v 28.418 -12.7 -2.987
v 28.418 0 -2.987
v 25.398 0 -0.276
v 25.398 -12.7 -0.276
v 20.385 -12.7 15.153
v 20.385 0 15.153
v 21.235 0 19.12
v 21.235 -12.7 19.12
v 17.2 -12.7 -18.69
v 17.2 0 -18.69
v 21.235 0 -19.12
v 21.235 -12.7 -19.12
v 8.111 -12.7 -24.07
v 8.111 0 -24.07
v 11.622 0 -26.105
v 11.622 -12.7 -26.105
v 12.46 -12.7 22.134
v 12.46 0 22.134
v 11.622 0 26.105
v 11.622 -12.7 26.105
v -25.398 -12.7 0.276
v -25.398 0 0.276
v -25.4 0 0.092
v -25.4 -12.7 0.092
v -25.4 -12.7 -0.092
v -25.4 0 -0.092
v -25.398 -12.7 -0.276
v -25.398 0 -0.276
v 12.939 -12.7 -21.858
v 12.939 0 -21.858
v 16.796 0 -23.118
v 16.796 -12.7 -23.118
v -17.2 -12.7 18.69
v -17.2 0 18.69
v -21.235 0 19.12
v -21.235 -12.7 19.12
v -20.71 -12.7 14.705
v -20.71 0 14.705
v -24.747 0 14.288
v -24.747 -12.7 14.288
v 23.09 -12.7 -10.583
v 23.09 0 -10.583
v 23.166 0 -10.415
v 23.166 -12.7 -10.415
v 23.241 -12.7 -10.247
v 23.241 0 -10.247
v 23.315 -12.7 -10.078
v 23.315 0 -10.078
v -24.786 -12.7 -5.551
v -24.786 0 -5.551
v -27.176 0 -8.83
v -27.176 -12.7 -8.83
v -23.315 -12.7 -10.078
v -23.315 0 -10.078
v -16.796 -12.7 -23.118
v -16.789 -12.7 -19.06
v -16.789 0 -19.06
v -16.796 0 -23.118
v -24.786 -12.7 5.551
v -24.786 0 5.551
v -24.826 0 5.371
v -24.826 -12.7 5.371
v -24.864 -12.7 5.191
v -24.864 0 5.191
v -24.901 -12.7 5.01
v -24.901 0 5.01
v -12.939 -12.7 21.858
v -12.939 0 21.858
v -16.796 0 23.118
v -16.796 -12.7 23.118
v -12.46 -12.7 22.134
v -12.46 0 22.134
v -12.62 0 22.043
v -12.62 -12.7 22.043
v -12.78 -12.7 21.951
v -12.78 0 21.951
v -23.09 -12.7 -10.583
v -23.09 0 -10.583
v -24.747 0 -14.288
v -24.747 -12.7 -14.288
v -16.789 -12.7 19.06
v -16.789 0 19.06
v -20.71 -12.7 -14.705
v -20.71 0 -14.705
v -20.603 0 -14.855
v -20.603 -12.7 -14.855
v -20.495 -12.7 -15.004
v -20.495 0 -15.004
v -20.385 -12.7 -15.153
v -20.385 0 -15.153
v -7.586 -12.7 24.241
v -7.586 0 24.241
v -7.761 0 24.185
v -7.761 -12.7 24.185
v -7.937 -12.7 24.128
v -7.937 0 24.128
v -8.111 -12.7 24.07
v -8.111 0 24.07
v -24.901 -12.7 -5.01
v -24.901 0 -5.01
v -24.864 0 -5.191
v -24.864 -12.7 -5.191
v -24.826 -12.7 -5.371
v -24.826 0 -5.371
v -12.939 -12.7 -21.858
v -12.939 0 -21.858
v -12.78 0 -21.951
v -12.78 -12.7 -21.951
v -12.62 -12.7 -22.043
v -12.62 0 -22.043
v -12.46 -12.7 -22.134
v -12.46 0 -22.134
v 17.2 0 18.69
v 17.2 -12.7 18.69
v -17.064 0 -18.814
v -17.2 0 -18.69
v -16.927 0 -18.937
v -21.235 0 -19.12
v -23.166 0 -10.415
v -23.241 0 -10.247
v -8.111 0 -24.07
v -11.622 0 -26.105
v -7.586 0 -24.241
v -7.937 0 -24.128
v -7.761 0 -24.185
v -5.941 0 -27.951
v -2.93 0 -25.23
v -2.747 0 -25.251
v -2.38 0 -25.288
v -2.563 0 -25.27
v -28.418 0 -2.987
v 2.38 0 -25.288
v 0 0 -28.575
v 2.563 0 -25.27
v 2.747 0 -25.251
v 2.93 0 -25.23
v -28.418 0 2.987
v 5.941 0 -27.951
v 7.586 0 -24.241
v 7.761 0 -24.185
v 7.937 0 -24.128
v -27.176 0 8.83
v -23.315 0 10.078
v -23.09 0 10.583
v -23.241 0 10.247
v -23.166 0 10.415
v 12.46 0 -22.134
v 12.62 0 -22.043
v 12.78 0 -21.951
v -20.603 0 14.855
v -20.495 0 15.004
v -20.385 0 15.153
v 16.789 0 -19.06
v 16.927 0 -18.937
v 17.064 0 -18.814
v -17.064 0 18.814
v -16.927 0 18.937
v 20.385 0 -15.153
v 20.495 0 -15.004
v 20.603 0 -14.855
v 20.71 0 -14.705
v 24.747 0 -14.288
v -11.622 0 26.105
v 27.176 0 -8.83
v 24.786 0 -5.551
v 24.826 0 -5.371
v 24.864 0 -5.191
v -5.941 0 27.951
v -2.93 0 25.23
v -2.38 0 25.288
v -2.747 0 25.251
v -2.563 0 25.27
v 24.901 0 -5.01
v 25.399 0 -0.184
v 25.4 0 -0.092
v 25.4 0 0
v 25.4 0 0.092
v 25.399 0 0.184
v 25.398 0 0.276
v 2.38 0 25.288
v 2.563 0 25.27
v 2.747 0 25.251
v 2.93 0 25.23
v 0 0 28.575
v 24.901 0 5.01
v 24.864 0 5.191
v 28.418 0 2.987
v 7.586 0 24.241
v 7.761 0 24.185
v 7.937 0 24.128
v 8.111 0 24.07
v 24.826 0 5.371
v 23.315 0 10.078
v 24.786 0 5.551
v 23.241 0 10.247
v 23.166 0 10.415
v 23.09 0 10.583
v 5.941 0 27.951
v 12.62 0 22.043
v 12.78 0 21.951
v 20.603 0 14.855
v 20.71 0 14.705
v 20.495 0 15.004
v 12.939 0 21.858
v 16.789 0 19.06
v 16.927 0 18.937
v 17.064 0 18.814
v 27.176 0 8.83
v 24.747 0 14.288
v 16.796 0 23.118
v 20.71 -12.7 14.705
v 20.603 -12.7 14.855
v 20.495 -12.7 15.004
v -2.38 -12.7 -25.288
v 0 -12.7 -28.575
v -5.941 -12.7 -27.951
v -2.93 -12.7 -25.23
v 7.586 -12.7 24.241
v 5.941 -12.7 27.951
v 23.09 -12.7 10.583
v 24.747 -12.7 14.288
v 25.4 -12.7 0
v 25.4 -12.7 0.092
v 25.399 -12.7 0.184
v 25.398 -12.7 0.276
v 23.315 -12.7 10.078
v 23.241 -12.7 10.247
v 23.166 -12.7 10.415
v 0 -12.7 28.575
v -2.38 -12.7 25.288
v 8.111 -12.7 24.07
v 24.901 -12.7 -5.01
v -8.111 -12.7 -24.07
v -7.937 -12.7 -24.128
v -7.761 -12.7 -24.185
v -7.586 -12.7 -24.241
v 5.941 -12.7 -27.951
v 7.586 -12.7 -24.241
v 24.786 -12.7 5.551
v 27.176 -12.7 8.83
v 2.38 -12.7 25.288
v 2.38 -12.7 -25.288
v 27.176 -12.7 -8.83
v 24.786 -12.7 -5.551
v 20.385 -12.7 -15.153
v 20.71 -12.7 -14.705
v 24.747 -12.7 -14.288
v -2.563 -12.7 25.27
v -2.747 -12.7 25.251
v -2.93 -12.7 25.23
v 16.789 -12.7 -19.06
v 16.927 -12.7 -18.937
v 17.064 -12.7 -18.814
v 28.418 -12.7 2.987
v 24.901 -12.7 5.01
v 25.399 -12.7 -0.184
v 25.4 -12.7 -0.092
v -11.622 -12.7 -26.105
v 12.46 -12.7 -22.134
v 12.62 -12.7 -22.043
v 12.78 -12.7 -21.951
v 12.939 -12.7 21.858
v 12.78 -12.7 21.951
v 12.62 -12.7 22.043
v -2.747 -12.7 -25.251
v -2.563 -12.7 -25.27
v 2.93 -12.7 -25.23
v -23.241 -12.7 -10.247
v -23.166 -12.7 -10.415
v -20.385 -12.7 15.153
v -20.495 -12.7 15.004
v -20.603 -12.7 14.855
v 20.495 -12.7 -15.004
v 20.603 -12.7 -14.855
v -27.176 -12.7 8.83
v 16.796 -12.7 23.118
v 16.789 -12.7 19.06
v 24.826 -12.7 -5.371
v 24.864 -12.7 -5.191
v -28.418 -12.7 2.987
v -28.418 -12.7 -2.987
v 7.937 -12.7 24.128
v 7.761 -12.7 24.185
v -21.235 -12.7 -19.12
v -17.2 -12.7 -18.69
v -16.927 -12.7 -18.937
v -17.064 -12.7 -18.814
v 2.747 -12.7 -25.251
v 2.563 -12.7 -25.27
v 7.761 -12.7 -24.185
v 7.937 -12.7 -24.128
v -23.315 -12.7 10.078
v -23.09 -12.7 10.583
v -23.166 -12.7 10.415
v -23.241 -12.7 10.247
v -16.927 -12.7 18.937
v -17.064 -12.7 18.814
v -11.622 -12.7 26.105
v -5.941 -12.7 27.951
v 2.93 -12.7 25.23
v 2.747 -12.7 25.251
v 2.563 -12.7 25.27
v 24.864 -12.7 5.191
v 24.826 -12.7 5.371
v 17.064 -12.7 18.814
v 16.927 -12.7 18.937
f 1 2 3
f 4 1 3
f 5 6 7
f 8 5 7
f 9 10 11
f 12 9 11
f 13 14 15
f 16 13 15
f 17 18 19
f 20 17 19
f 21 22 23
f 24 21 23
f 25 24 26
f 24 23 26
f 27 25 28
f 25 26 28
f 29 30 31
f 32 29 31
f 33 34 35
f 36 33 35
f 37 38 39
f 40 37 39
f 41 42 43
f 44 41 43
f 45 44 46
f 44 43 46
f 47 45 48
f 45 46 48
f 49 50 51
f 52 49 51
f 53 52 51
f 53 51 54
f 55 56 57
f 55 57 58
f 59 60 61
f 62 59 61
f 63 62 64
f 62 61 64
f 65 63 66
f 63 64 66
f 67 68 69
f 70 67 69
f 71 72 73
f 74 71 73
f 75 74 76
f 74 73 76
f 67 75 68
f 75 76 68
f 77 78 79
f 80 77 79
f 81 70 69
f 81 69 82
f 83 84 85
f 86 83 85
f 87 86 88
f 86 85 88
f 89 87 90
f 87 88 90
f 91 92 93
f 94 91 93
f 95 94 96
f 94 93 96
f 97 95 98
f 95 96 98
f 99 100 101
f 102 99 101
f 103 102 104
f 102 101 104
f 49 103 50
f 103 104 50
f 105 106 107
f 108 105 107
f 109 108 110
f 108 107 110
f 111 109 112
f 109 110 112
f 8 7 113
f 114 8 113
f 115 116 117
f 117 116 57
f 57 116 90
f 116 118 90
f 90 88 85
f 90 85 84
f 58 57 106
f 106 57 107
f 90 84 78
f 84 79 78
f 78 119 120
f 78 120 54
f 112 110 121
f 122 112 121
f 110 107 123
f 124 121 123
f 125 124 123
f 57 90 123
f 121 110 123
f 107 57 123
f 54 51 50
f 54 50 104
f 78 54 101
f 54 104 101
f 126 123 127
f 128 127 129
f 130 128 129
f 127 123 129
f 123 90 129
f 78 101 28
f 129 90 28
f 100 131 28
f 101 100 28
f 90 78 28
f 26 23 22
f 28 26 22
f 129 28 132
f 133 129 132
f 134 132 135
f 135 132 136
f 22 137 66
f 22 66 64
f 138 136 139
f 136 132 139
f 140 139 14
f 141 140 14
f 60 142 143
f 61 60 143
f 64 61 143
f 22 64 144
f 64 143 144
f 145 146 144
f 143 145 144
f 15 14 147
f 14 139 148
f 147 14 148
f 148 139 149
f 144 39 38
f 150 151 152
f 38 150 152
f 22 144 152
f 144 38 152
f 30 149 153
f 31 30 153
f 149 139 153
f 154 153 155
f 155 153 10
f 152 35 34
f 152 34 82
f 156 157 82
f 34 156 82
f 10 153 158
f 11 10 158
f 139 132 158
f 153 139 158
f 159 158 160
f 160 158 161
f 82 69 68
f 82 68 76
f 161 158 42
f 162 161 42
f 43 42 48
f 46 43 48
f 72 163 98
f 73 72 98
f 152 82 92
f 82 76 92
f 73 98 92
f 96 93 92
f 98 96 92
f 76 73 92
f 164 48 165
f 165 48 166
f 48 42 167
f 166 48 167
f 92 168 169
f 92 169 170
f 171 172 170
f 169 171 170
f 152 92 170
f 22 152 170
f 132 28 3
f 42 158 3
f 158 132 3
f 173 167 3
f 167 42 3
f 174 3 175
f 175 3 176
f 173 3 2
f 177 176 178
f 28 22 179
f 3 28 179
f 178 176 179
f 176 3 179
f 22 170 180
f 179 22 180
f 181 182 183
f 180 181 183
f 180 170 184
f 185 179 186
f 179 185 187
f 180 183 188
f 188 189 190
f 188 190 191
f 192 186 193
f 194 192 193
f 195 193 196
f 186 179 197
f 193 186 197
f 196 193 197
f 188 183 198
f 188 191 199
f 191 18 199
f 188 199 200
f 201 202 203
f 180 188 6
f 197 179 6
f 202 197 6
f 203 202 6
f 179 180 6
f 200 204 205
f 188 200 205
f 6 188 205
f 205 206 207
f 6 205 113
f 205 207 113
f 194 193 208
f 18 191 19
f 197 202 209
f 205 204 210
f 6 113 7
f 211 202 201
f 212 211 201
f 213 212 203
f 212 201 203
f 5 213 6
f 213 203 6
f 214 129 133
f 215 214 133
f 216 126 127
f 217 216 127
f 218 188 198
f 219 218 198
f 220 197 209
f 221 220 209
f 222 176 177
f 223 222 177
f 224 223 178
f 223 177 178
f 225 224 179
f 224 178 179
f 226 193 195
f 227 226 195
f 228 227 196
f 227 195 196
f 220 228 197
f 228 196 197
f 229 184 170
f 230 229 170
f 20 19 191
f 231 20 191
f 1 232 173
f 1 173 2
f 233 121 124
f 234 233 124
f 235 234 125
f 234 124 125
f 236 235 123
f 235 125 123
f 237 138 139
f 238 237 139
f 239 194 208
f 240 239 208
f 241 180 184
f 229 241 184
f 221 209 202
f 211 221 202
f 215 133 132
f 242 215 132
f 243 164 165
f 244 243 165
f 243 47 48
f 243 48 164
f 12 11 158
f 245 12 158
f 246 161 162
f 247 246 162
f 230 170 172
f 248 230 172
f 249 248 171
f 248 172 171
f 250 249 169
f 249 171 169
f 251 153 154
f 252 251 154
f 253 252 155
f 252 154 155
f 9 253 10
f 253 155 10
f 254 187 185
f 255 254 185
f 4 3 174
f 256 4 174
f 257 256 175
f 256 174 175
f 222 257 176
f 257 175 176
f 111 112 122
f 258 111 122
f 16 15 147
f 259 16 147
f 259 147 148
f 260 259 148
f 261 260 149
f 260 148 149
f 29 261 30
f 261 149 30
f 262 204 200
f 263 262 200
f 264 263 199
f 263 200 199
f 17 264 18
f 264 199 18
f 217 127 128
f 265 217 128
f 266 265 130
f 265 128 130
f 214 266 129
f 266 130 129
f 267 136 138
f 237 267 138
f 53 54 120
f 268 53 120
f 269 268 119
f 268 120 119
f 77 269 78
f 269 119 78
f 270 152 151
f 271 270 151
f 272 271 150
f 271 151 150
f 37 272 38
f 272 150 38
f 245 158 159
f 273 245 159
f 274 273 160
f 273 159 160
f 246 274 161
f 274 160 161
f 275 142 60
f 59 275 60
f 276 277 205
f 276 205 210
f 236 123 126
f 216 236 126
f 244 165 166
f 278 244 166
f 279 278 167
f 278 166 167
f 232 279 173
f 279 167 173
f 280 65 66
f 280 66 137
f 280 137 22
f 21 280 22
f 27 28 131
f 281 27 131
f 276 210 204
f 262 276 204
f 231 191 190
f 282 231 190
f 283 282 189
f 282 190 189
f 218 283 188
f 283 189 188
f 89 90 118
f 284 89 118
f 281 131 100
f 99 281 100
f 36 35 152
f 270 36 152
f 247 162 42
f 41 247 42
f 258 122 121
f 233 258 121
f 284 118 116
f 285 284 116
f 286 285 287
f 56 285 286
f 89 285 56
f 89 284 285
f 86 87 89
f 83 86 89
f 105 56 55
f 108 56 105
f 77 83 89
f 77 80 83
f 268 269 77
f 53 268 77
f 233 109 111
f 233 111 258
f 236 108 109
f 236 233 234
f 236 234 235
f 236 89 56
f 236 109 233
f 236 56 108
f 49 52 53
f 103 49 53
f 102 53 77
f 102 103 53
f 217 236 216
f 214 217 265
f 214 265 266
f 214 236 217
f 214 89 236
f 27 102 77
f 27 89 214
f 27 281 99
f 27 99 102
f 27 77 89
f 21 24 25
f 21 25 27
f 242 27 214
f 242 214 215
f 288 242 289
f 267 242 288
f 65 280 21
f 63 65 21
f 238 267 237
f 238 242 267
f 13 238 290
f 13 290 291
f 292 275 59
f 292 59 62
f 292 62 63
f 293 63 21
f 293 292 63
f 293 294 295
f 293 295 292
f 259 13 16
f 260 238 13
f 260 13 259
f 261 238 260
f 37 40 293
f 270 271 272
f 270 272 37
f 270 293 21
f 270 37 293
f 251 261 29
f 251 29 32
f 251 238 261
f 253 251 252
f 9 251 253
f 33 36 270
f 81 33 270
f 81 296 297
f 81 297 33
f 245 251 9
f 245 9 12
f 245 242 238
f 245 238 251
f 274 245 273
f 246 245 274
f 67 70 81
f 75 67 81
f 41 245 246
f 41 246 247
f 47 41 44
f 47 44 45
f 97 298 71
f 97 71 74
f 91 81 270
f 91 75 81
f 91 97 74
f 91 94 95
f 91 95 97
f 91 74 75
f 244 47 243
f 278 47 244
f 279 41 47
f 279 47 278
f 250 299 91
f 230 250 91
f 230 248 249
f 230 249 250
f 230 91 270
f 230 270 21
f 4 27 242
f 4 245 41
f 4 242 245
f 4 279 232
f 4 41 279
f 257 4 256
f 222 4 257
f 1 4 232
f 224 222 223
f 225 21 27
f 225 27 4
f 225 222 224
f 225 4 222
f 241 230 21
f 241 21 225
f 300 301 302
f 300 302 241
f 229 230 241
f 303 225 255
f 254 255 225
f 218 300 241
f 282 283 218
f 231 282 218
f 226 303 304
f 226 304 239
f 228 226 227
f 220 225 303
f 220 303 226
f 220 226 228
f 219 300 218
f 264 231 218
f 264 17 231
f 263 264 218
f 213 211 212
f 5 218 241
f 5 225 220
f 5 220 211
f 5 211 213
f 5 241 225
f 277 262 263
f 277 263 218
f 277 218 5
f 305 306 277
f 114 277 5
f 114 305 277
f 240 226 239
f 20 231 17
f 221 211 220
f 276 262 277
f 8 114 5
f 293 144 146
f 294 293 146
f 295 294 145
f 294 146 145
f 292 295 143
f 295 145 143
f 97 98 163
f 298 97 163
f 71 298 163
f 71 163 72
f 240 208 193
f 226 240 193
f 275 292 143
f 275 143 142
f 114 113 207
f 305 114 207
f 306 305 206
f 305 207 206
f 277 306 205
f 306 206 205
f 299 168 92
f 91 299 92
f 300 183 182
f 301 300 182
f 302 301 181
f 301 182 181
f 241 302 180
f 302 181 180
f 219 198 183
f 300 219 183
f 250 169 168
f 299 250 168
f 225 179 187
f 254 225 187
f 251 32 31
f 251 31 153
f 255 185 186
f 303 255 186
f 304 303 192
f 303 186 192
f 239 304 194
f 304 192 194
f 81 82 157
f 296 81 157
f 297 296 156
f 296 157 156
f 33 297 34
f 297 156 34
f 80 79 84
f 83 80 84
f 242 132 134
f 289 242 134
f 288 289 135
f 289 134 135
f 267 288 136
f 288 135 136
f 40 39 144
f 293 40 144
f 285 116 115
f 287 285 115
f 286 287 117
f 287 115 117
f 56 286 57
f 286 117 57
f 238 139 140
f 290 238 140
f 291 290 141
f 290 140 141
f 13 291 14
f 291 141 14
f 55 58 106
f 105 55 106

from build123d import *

# Parameters (mm, degrees)
F1_DEPTH = 12.7


with BuildPart() as f1:
    # F0 (on Front) → F1 (new body)
    with BuildSketch(Plane.XZ):
        with BuildLine():
            ThreePointArc((25.398495, -0.276457), (25.399624, -0.13823), (25.4, 0))
            ThreePointArc((25.4, 0), (25.399624, 0.13823), (25.398495, 0.276457))
            ThreePointArc((25.398495, 0.276457), (25.260856, 2.655023), (24.900956, 5.010229))
            ThreePointArc((24.900956, 5.010229), (24.844949, 5.280957), (24.785999, 5.55106))
            ThreePointArc((24.785999, 5.55106), (24.156836, 7.849032), (23.315125, 10.077943))
            ThreePointArc((23.315125, 10.077943), (23.204055, 10.331111), (23.090235, 10.583054))
            ThreePointArc((23.090235, 10.583054), (21.997045, 12.7), (20.710312, 14.705203))
            ThreePointArc((20.710312, 14.705203), (20.549032, 14.929745), (20.385317, 15.152519))
            ThreePointArc((20.385317, 15.152519), (18.875879, 16.995917), (17.200358, 18.689775))
            ThreePointArc((17.200358, 18.689775), (16.995917, 18.875879), (16.789463, 19.059746))
            ThreePointArc((16.789463, 19.059746), (14.929745, 20.549032), (12.938666, 21.857514))
            ThreePointArc((12.938666, 21.857514), (12.7, 21.997045), (12.459829, 22.133971))
            ThreePointArc((12.459829, 22.133971), (10.331111, 23.204055), (8.111493, 24.069975))
            ThreePointArc((8.111493, 24.069975), (7.849032, 24.156836), (7.585641, 24.240834))
            ThreePointArc((7.585641, 24.240834), (5.280957, 24.844949), (2.929808, 25.230462))
            ThreePointArc((2.929808, 25.230462), (2.655023, 25.260856), (2.379924, 25.288257))
            ThreePointArc((2.379924, 25.288257), (1.191273, 25.372049), (0, 25.4))
            ThreePointArc((0, 25.4), (-1.191273, 25.372049), (-2.379924, 25.288257))
            ThreePointArc((-2.379924, 25.288257), (-2.655023, 25.260856), (-2.929808, 25.230462))
            ThreePointArc((-2.929808, 25.230462), (-5.280957, 24.844949), (-7.585641, 24.240834))
            ThreePointArc((-7.585641, 24.240834), (-7.849032, 24.156836), (-8.111493, 24.069975))
            ThreePointArc((-8.111493, 24.069975), (-10.331111, 23.204055), (-12.459829, 22.133971))
            ThreePointArc((-12.459829, 22.133971), (-12.7, 21.997045), (-12.938666, 21.857514))
            ThreePointArc((-12.938666, 21.857514), (-14.929745, 20.549032), (-16.789463, 19.059746))
            ThreePointArc((-16.789463, 19.059746), (-16.995917, 18.875879), (-17.200358, 18.689775))
            ThreePointArc((-17.200358, 18.689775), (-18.875879, 16.995917), (-20.385317, 15.152519))
            ThreePointArc((-20.385317, 15.152519), (-20.549032, 14.929745), (-20.710312, 14.705203))
            ThreePointArc((-20.710312, 14.705203), (-21.997045, 12.7), (-23.090235, 10.583054))
            ThreePointArc((-23.090235, 10.583054), (-23.204055, 10.331111), (-23.315125, 10.077943))
            ThreePointArc((-23.315125, 10.077943), (-24.156836, 7.849032), (-24.785999, 5.55106))
            ThreePointArc((-24.785999, 5.55106), (-24.844949, 5.280957), (-24.900956, 5.010229))
            ThreePointArc((-24.900956, 5.010229), (-25.260856, 2.655023), (-25.398495, 0.276457))
            ThreePointArc((-25.398495, 0.276457), (-25.4, 0), (-25.398495, -0.276457))
            ThreePointArc((-25.398495, -0.276457), (-25.260856, -2.655023), (-24.900956, -5.010229))
            ThreePointArc((-24.900956, -5.010229), (-24.844949, -5.280957), (-24.785999, -5.55106))
            ThreePointArc((-24.785999, -5.55106), (-24.156836, -7.849032), (-23.315125, -10.077943))
            ThreePointArc((-23.315125, -10.077943), (-23.204055, -10.331111), (-23.090235, -10.583054))
            ThreePointArc((-23.090235, -10.583054), (-21.997045, -12.7), (-20.710312, -14.705203))
            ThreePointArc((-20.710312, -14.705203), (-20.549032, -14.929745), (-20.385317, -15.152519))
            ThreePointArc((-20.385317, -15.152519), (-18.875879, -16.995917), (-17.200358, -18.689775))
            ThreePointArc((-17.200358, -18.689775), (-16.995917, -18.875879), (-16.789463, -19.059746))
            ThreePointArc((-16.789463, -19.059746), (-14.929745, -20.549032), (-12.938666, -21.857514))
            ThreePointArc((-12.938666, -21.857514), (-12.7, -21.997045), (-12.459829, -22.133971))
            ThreePointArc((-12.459829, -22.133971), (-10.331111, -23.204055), (-8.111493, -24.069975))
            ThreePointArc((-8.111493, -24.069975), (-7.849032, -24.156836), (-7.585641, -24.240834))
            ThreePointArc((-7.585641, -24.240834), (-5.280957, -24.844949), (-2.929808, -25.230462))
            ThreePointArc((-2.929808, -25.230462), (-2.655023, -25.260856), (-2.379924, -25.288257))
            ThreePointArc((-2.379924, -25.288257), (0, -25.4), (2.379924, -25.288257))
            ThreePointArc((2.379924, -25.288257), (2.655023, -25.260856), (2.929808, -25.230462))
            ThreePointArc((2.929808, -25.230462), (5.280957, -24.844949), (7.585641, -24.240834))
            ThreePointArc((7.585641, -24.240834), (7.849032, -24.156836), (8.111493, -24.069975))
            ThreePointArc((8.111493, -24.069975), (10.331111, -23.204055), (12.459829, -22.133971))
            ThreePointArc((12.459829, -22.133971), (12.7, -21.997045), (12.938666, -21.857514))
            ThreePointArc((12.938666, -21.857514), (14.929745, -20.549032), (16.789463, -19.059746))
            ThreePointArc((16.789463, -19.059746), (16.995917, -18.875879), (17.200358, -18.689775))
            ThreePointArc((17.200358, -18.689775), (18.875879, -16.995917), (20.385317, -15.152519))
            ThreePointArc((20.385317, -15.152519), (20.549032, -14.929745), (20.710312, -14.705203))
            ThreePointArc((20.710312, -14.705203), (21.997045, -12.7), (23.090235, -10.583054))
            ThreePointArc((23.090235, -10.583054), (23.204055, -10.331111), (23.315125, -10.077943))
            ThreePointArc((23.315125, -10.077943), (24.156836, -7.849032), (24.785999, -5.55106))
            ThreePointArc((24.785999, -5.55106), (24.844949, -5.280957), (24.900956, -5.010229))
            ThreePointArc((24.900956, -5.010229), (25.260856, -2.655023), (25.398495, -0.276457))
        make_face()
        with BuildLine():
            ThreePointArc((24.900956, 5.010229), (25.260856, 2.655023), (25.398495, 0.276457))
            Line((25.398495, 0.276457), (28.418463, 2.986901))
            Line((28.418463, 2.986901), (24.900956, 5.010229))
        make_face()
        with BuildLine():
            Line((28.418463, -2.986901), (25.398495, -0.276457))
            ThreePointArc((25.398495, -0.276457), (25.260856, -2.655023), (24.900956, -5.010229))
            Line((24.900956, -5.010229), (28.418463, -2.986901))
        make_face()
        with BuildLine():
            ThreePointArc((23.315125, 10.077943), (24.156836, 7.849032), (24.785999, 5.55106))
            Line((24.785999, 5.55106), (27.17644, 8.830161))
            Line((27.17644, 8.830161), (23.315125, 10.077943))
        make_face()
        with BuildLine():
            Line((27.17644, -8.830161), (24.785999, -5.55106))
            ThreePointArc((24.785999, -5.55106), (24.156836, -7.849032), (23.315125, -10.077943))
            Line((23.315125, -10.077943), (27.17644, -8.830161))
        make_face()
        with BuildLine():
            ThreePointArc((20.710312, 14.705203), (21.997045, 12.7), (23.090235, 10.583054))
            Line((23.090235, 10.583054), (24.746676, 14.2875))
            Line((24.746676, 14.2875), (20.710312, 14.705203))
        make_face()
        with BuildLine():
            Line((24.746676, -14.2875), (23.090235, -10.583054))
            ThreePointArc((23.090235, -10.583054), (21.997045, -12.7), (20.710312, -14.705203))
            Line((20.710312, -14.705203), (24.746676, -14.2875))
        make_face()
        with BuildLine():
            ThreePointArc((17.200358, 18.689775), (18.875879, 16.995917), (20.385317, 15.152519))
            Line((20.385317, 15.152519), (21.235363, 19.120407))
            Line((21.235363, 19.120407), (17.200358, 18.689775))
        make_face()
        with BuildLine():
            Line((21.235363, -19.120407), (20.385317, -15.152519))
            ThreePointArc((20.385317, -15.152519), (18.875879, -16.995917), (17.200358, -18.689775))
            Line((17.200358, -18.689775), (21.235363, -19.120407))
        make_face()
        with BuildLine():
            ThreePointArc((12.938666, 21.857514), (14.929745, 20.549032), (16.789463, 19.059746))
            Line((16.789463, 19.059746), (16.795964, 23.117661))
            Line((16.795964, 23.117661), (12.938666, 21.857514))
        make_face()
        with BuildLine():
            Line((16.795964, -23.117661), (16.789463, -19.059746))
            ThreePointArc((16.789463, -19.059746), (14.929745, -20.549032), (12.938666, -21.857514))
            Line((12.938666, -21.857514), (16.795964, -23.117661))
        make_face()
        with BuildLine():
            ThreePointArc((8.111493, 24.069975), (10.331111, 23.204055), (12.459829, 22.133971))
            Line((12.459829, 22.133971), (11.6225, 26.104561))
            Line((11.6225, 26.104561), (8.111493, 24.069975))
        make_face()
        with BuildLine():
            Line((11.6225, -26.104561), (12.459829, -22.133971))
            ThreePointArc((12.459829, -22.133971), (10.331111, -23.204055), (8.111493, -24.069975))
            Line((8.111493, -24.069975), (11.6225, -26.104561))
        make_face()
        with BuildLine():
            ThreePointArc((2.929808, 25.230462), (5.280957, 24.844949), (7.585641, 24.240834))
            Line((7.585641, 24.240834), (5.941077, 27.950568))
            Line((5.941077, 27.950568), (2.929808, 25.230462))
        make_face()
        with BuildLine():
            Line((5.941077, -27.950568), (7.585641, -24.240834))
            ThreePointArc((7.585641, -24.240834), (5.280957, -24.844949), (2.929808, -25.230462))
            Line((2.929808, -25.230462), (5.941077, -27.950568))
        make_face()
        with BuildLine():
            ThreePointArc((0, 25.4), (1.191273, 25.372049), (2.379924, 25.288257))
            Line((2.379924, 25.288257), (0, 28.575))
            Line((0, 28.575), (0, 25.4))
        make_face()
        with BuildLine():
            Line((0, -28.575), (2.379924, -25.288257))
            ThreePointArc((2.379924, -25.288257), (0, -25.4), (-2.379924, -25.288257))
            Line((-2.379924, -25.288257), (0, -28.575))
        make_face()
        with BuildLine():
            ThreePointArc((-2.379924, 25.288257), (-1.191273, 25.372049), (0, 25.4))
            Line((0, 25.4), (0, 28.575))
            Line((0, 28.575), (-2.379924, 25.288257))
        make_face()
        with BuildLine():
            Line((-5.941077, -27.950568), (-2.929808, -25.230462))
            ThreePointArc((-2.929808, -25.230462), (-5.280957, -24.844949), (-7.585641, -24.240834))
            Line((-7.585641, -24.240834), (-5.941077, -27.950568))
        make_face()
        with BuildLine():
            ThreePointArc((-7.585641, 24.240834), (-5.280957, 24.844949), (-2.929808, 25.230462))
            Line((-2.929808, 25.230462), (-5.941077, 27.950568))
            Line((-5.941077, 27.950568), (-7.585641, 24.240834))
        make_face()
        with BuildLine():
            Line((-11.6225, -26.104561), (-8.111493, -24.069975))
            ThreePointArc((-8.111493, -24.069975), (-10.331111, -23.204055), (-12.459829, -22.133971))
            Line((-12.459829, -22.133971), (-11.6225, -26.104561))
        make_face()
        with BuildLine():
            ThreePointArc((-12.459829, 22.133971), (-10.331111, 23.204055), (-8.111493, 24.069975))
            Line((-8.111493, 24.069975), (-11.6225, 26.104561))
            Line((-11.6225, 26.104561), (-12.459829, 22.133971))
        make_face()
        with BuildLine():
            Line((-16.795964, -23.117661), (-12.938666, -21.857514))
            ThreePointArc((-12.938666, -21.857514), (-14.929745, -20.549032), (-16.789463, -19.059746))
            Line((-16.789463, -19.059746), (-16.795964, -23.117661))
        make_face()
        with BuildLine():
            ThreePointArc((-16.789463, 19.059746), (-14.929745, 20.549032), (-12.938666, 21.857514))
            Line((-12.938666, 21.857514), (-16.795964, 23.117661))
            Line((-16.795964, 23.117661), (-16.789463, 19.059746))
        make_face()
        with BuildLine():
            Line((-21.235363, -19.120407), (-17.200358, -18.689775))
            ThreePointArc((-17.200358, -18.689775), (-18.875879, -16.995917), (-20.385317, -15.152519))
            Line((-20.385317, -15.152519), (-21.235363, -19.120407))
        make_face()
        with BuildLine():
            ThreePointArc((-20.385317, 15.152519), (-18.875879, 16.995917), (-17.200358, 18.689775))
            Line((-17.200358, 18.689775), (-21.235363, 19.120407))
            Line((-21.235363, 19.120407), (-20.385317, 15.152519))
        make_face()
        with BuildLine():
            Line((-24.746676, -14.2875), (-20.710312, -14.705203))
            ThreePointArc((-20.710312, -14.705203), (-21.997045, -12.7), (-23.090235, -10.583054))
            Line((-23.090235, -10.583054), (-24.746676, -14.2875))
        make_face()
        with BuildLine():
            ThreePointArc((-23.090235, 10.583054), (-21.997045, 12.7), (-20.710312, 14.705203))
            Line((-20.710312, 14.705203), (-24.746676, 14.2875))
            Line((-24.746676, 14.2875), (-23.090235, 10.583054))
        make_face()
        with BuildLine():
            Line((-27.17644, -8.830161), (-23.315125, -10.077943))
            ThreePointArc((-23.315125, -10.077943), (-24.156836, -7.849032), (-24.785999, -5.55106))
            Line((-24.785999, -5.55106), (-27.17644, -8.830161))
        make_face()
        with BuildLine():
            ThreePointArc((-24.785999, 5.55106), (-24.156836, 7.849032), (-23.315125, 10.077943))
            Line((-23.315125, 10.077943), (-27.17644, 8.830161))
            Line((-27.17644, 8.830161), (-24.785999, 5.55106))
        make_face()
        with BuildLine():
            Line((-28.418463, -2.986901), (-24.900956, -5.010229))
            ThreePointArc((-24.900956, -5.010229), (-25.260856, -2.655023), (-25.398495, -0.276457))
            Line((-25.398495, -0.276457), (-28.418463, -2.986901))
        make_face()
        with BuildLine():
            ThreePointArc((-25.398495, 0.276457), (-25.260856, 2.655023), (-24.900956, 5.010229))
            Line((-24.900956, 5.010229), (-28.418463, 2.986901))
            Line((-28.418463, 2.986901), (-25.398495, 0.276457))
        make_face()
    extrude(amount=F1_DEPTH)


solid = f1.part
